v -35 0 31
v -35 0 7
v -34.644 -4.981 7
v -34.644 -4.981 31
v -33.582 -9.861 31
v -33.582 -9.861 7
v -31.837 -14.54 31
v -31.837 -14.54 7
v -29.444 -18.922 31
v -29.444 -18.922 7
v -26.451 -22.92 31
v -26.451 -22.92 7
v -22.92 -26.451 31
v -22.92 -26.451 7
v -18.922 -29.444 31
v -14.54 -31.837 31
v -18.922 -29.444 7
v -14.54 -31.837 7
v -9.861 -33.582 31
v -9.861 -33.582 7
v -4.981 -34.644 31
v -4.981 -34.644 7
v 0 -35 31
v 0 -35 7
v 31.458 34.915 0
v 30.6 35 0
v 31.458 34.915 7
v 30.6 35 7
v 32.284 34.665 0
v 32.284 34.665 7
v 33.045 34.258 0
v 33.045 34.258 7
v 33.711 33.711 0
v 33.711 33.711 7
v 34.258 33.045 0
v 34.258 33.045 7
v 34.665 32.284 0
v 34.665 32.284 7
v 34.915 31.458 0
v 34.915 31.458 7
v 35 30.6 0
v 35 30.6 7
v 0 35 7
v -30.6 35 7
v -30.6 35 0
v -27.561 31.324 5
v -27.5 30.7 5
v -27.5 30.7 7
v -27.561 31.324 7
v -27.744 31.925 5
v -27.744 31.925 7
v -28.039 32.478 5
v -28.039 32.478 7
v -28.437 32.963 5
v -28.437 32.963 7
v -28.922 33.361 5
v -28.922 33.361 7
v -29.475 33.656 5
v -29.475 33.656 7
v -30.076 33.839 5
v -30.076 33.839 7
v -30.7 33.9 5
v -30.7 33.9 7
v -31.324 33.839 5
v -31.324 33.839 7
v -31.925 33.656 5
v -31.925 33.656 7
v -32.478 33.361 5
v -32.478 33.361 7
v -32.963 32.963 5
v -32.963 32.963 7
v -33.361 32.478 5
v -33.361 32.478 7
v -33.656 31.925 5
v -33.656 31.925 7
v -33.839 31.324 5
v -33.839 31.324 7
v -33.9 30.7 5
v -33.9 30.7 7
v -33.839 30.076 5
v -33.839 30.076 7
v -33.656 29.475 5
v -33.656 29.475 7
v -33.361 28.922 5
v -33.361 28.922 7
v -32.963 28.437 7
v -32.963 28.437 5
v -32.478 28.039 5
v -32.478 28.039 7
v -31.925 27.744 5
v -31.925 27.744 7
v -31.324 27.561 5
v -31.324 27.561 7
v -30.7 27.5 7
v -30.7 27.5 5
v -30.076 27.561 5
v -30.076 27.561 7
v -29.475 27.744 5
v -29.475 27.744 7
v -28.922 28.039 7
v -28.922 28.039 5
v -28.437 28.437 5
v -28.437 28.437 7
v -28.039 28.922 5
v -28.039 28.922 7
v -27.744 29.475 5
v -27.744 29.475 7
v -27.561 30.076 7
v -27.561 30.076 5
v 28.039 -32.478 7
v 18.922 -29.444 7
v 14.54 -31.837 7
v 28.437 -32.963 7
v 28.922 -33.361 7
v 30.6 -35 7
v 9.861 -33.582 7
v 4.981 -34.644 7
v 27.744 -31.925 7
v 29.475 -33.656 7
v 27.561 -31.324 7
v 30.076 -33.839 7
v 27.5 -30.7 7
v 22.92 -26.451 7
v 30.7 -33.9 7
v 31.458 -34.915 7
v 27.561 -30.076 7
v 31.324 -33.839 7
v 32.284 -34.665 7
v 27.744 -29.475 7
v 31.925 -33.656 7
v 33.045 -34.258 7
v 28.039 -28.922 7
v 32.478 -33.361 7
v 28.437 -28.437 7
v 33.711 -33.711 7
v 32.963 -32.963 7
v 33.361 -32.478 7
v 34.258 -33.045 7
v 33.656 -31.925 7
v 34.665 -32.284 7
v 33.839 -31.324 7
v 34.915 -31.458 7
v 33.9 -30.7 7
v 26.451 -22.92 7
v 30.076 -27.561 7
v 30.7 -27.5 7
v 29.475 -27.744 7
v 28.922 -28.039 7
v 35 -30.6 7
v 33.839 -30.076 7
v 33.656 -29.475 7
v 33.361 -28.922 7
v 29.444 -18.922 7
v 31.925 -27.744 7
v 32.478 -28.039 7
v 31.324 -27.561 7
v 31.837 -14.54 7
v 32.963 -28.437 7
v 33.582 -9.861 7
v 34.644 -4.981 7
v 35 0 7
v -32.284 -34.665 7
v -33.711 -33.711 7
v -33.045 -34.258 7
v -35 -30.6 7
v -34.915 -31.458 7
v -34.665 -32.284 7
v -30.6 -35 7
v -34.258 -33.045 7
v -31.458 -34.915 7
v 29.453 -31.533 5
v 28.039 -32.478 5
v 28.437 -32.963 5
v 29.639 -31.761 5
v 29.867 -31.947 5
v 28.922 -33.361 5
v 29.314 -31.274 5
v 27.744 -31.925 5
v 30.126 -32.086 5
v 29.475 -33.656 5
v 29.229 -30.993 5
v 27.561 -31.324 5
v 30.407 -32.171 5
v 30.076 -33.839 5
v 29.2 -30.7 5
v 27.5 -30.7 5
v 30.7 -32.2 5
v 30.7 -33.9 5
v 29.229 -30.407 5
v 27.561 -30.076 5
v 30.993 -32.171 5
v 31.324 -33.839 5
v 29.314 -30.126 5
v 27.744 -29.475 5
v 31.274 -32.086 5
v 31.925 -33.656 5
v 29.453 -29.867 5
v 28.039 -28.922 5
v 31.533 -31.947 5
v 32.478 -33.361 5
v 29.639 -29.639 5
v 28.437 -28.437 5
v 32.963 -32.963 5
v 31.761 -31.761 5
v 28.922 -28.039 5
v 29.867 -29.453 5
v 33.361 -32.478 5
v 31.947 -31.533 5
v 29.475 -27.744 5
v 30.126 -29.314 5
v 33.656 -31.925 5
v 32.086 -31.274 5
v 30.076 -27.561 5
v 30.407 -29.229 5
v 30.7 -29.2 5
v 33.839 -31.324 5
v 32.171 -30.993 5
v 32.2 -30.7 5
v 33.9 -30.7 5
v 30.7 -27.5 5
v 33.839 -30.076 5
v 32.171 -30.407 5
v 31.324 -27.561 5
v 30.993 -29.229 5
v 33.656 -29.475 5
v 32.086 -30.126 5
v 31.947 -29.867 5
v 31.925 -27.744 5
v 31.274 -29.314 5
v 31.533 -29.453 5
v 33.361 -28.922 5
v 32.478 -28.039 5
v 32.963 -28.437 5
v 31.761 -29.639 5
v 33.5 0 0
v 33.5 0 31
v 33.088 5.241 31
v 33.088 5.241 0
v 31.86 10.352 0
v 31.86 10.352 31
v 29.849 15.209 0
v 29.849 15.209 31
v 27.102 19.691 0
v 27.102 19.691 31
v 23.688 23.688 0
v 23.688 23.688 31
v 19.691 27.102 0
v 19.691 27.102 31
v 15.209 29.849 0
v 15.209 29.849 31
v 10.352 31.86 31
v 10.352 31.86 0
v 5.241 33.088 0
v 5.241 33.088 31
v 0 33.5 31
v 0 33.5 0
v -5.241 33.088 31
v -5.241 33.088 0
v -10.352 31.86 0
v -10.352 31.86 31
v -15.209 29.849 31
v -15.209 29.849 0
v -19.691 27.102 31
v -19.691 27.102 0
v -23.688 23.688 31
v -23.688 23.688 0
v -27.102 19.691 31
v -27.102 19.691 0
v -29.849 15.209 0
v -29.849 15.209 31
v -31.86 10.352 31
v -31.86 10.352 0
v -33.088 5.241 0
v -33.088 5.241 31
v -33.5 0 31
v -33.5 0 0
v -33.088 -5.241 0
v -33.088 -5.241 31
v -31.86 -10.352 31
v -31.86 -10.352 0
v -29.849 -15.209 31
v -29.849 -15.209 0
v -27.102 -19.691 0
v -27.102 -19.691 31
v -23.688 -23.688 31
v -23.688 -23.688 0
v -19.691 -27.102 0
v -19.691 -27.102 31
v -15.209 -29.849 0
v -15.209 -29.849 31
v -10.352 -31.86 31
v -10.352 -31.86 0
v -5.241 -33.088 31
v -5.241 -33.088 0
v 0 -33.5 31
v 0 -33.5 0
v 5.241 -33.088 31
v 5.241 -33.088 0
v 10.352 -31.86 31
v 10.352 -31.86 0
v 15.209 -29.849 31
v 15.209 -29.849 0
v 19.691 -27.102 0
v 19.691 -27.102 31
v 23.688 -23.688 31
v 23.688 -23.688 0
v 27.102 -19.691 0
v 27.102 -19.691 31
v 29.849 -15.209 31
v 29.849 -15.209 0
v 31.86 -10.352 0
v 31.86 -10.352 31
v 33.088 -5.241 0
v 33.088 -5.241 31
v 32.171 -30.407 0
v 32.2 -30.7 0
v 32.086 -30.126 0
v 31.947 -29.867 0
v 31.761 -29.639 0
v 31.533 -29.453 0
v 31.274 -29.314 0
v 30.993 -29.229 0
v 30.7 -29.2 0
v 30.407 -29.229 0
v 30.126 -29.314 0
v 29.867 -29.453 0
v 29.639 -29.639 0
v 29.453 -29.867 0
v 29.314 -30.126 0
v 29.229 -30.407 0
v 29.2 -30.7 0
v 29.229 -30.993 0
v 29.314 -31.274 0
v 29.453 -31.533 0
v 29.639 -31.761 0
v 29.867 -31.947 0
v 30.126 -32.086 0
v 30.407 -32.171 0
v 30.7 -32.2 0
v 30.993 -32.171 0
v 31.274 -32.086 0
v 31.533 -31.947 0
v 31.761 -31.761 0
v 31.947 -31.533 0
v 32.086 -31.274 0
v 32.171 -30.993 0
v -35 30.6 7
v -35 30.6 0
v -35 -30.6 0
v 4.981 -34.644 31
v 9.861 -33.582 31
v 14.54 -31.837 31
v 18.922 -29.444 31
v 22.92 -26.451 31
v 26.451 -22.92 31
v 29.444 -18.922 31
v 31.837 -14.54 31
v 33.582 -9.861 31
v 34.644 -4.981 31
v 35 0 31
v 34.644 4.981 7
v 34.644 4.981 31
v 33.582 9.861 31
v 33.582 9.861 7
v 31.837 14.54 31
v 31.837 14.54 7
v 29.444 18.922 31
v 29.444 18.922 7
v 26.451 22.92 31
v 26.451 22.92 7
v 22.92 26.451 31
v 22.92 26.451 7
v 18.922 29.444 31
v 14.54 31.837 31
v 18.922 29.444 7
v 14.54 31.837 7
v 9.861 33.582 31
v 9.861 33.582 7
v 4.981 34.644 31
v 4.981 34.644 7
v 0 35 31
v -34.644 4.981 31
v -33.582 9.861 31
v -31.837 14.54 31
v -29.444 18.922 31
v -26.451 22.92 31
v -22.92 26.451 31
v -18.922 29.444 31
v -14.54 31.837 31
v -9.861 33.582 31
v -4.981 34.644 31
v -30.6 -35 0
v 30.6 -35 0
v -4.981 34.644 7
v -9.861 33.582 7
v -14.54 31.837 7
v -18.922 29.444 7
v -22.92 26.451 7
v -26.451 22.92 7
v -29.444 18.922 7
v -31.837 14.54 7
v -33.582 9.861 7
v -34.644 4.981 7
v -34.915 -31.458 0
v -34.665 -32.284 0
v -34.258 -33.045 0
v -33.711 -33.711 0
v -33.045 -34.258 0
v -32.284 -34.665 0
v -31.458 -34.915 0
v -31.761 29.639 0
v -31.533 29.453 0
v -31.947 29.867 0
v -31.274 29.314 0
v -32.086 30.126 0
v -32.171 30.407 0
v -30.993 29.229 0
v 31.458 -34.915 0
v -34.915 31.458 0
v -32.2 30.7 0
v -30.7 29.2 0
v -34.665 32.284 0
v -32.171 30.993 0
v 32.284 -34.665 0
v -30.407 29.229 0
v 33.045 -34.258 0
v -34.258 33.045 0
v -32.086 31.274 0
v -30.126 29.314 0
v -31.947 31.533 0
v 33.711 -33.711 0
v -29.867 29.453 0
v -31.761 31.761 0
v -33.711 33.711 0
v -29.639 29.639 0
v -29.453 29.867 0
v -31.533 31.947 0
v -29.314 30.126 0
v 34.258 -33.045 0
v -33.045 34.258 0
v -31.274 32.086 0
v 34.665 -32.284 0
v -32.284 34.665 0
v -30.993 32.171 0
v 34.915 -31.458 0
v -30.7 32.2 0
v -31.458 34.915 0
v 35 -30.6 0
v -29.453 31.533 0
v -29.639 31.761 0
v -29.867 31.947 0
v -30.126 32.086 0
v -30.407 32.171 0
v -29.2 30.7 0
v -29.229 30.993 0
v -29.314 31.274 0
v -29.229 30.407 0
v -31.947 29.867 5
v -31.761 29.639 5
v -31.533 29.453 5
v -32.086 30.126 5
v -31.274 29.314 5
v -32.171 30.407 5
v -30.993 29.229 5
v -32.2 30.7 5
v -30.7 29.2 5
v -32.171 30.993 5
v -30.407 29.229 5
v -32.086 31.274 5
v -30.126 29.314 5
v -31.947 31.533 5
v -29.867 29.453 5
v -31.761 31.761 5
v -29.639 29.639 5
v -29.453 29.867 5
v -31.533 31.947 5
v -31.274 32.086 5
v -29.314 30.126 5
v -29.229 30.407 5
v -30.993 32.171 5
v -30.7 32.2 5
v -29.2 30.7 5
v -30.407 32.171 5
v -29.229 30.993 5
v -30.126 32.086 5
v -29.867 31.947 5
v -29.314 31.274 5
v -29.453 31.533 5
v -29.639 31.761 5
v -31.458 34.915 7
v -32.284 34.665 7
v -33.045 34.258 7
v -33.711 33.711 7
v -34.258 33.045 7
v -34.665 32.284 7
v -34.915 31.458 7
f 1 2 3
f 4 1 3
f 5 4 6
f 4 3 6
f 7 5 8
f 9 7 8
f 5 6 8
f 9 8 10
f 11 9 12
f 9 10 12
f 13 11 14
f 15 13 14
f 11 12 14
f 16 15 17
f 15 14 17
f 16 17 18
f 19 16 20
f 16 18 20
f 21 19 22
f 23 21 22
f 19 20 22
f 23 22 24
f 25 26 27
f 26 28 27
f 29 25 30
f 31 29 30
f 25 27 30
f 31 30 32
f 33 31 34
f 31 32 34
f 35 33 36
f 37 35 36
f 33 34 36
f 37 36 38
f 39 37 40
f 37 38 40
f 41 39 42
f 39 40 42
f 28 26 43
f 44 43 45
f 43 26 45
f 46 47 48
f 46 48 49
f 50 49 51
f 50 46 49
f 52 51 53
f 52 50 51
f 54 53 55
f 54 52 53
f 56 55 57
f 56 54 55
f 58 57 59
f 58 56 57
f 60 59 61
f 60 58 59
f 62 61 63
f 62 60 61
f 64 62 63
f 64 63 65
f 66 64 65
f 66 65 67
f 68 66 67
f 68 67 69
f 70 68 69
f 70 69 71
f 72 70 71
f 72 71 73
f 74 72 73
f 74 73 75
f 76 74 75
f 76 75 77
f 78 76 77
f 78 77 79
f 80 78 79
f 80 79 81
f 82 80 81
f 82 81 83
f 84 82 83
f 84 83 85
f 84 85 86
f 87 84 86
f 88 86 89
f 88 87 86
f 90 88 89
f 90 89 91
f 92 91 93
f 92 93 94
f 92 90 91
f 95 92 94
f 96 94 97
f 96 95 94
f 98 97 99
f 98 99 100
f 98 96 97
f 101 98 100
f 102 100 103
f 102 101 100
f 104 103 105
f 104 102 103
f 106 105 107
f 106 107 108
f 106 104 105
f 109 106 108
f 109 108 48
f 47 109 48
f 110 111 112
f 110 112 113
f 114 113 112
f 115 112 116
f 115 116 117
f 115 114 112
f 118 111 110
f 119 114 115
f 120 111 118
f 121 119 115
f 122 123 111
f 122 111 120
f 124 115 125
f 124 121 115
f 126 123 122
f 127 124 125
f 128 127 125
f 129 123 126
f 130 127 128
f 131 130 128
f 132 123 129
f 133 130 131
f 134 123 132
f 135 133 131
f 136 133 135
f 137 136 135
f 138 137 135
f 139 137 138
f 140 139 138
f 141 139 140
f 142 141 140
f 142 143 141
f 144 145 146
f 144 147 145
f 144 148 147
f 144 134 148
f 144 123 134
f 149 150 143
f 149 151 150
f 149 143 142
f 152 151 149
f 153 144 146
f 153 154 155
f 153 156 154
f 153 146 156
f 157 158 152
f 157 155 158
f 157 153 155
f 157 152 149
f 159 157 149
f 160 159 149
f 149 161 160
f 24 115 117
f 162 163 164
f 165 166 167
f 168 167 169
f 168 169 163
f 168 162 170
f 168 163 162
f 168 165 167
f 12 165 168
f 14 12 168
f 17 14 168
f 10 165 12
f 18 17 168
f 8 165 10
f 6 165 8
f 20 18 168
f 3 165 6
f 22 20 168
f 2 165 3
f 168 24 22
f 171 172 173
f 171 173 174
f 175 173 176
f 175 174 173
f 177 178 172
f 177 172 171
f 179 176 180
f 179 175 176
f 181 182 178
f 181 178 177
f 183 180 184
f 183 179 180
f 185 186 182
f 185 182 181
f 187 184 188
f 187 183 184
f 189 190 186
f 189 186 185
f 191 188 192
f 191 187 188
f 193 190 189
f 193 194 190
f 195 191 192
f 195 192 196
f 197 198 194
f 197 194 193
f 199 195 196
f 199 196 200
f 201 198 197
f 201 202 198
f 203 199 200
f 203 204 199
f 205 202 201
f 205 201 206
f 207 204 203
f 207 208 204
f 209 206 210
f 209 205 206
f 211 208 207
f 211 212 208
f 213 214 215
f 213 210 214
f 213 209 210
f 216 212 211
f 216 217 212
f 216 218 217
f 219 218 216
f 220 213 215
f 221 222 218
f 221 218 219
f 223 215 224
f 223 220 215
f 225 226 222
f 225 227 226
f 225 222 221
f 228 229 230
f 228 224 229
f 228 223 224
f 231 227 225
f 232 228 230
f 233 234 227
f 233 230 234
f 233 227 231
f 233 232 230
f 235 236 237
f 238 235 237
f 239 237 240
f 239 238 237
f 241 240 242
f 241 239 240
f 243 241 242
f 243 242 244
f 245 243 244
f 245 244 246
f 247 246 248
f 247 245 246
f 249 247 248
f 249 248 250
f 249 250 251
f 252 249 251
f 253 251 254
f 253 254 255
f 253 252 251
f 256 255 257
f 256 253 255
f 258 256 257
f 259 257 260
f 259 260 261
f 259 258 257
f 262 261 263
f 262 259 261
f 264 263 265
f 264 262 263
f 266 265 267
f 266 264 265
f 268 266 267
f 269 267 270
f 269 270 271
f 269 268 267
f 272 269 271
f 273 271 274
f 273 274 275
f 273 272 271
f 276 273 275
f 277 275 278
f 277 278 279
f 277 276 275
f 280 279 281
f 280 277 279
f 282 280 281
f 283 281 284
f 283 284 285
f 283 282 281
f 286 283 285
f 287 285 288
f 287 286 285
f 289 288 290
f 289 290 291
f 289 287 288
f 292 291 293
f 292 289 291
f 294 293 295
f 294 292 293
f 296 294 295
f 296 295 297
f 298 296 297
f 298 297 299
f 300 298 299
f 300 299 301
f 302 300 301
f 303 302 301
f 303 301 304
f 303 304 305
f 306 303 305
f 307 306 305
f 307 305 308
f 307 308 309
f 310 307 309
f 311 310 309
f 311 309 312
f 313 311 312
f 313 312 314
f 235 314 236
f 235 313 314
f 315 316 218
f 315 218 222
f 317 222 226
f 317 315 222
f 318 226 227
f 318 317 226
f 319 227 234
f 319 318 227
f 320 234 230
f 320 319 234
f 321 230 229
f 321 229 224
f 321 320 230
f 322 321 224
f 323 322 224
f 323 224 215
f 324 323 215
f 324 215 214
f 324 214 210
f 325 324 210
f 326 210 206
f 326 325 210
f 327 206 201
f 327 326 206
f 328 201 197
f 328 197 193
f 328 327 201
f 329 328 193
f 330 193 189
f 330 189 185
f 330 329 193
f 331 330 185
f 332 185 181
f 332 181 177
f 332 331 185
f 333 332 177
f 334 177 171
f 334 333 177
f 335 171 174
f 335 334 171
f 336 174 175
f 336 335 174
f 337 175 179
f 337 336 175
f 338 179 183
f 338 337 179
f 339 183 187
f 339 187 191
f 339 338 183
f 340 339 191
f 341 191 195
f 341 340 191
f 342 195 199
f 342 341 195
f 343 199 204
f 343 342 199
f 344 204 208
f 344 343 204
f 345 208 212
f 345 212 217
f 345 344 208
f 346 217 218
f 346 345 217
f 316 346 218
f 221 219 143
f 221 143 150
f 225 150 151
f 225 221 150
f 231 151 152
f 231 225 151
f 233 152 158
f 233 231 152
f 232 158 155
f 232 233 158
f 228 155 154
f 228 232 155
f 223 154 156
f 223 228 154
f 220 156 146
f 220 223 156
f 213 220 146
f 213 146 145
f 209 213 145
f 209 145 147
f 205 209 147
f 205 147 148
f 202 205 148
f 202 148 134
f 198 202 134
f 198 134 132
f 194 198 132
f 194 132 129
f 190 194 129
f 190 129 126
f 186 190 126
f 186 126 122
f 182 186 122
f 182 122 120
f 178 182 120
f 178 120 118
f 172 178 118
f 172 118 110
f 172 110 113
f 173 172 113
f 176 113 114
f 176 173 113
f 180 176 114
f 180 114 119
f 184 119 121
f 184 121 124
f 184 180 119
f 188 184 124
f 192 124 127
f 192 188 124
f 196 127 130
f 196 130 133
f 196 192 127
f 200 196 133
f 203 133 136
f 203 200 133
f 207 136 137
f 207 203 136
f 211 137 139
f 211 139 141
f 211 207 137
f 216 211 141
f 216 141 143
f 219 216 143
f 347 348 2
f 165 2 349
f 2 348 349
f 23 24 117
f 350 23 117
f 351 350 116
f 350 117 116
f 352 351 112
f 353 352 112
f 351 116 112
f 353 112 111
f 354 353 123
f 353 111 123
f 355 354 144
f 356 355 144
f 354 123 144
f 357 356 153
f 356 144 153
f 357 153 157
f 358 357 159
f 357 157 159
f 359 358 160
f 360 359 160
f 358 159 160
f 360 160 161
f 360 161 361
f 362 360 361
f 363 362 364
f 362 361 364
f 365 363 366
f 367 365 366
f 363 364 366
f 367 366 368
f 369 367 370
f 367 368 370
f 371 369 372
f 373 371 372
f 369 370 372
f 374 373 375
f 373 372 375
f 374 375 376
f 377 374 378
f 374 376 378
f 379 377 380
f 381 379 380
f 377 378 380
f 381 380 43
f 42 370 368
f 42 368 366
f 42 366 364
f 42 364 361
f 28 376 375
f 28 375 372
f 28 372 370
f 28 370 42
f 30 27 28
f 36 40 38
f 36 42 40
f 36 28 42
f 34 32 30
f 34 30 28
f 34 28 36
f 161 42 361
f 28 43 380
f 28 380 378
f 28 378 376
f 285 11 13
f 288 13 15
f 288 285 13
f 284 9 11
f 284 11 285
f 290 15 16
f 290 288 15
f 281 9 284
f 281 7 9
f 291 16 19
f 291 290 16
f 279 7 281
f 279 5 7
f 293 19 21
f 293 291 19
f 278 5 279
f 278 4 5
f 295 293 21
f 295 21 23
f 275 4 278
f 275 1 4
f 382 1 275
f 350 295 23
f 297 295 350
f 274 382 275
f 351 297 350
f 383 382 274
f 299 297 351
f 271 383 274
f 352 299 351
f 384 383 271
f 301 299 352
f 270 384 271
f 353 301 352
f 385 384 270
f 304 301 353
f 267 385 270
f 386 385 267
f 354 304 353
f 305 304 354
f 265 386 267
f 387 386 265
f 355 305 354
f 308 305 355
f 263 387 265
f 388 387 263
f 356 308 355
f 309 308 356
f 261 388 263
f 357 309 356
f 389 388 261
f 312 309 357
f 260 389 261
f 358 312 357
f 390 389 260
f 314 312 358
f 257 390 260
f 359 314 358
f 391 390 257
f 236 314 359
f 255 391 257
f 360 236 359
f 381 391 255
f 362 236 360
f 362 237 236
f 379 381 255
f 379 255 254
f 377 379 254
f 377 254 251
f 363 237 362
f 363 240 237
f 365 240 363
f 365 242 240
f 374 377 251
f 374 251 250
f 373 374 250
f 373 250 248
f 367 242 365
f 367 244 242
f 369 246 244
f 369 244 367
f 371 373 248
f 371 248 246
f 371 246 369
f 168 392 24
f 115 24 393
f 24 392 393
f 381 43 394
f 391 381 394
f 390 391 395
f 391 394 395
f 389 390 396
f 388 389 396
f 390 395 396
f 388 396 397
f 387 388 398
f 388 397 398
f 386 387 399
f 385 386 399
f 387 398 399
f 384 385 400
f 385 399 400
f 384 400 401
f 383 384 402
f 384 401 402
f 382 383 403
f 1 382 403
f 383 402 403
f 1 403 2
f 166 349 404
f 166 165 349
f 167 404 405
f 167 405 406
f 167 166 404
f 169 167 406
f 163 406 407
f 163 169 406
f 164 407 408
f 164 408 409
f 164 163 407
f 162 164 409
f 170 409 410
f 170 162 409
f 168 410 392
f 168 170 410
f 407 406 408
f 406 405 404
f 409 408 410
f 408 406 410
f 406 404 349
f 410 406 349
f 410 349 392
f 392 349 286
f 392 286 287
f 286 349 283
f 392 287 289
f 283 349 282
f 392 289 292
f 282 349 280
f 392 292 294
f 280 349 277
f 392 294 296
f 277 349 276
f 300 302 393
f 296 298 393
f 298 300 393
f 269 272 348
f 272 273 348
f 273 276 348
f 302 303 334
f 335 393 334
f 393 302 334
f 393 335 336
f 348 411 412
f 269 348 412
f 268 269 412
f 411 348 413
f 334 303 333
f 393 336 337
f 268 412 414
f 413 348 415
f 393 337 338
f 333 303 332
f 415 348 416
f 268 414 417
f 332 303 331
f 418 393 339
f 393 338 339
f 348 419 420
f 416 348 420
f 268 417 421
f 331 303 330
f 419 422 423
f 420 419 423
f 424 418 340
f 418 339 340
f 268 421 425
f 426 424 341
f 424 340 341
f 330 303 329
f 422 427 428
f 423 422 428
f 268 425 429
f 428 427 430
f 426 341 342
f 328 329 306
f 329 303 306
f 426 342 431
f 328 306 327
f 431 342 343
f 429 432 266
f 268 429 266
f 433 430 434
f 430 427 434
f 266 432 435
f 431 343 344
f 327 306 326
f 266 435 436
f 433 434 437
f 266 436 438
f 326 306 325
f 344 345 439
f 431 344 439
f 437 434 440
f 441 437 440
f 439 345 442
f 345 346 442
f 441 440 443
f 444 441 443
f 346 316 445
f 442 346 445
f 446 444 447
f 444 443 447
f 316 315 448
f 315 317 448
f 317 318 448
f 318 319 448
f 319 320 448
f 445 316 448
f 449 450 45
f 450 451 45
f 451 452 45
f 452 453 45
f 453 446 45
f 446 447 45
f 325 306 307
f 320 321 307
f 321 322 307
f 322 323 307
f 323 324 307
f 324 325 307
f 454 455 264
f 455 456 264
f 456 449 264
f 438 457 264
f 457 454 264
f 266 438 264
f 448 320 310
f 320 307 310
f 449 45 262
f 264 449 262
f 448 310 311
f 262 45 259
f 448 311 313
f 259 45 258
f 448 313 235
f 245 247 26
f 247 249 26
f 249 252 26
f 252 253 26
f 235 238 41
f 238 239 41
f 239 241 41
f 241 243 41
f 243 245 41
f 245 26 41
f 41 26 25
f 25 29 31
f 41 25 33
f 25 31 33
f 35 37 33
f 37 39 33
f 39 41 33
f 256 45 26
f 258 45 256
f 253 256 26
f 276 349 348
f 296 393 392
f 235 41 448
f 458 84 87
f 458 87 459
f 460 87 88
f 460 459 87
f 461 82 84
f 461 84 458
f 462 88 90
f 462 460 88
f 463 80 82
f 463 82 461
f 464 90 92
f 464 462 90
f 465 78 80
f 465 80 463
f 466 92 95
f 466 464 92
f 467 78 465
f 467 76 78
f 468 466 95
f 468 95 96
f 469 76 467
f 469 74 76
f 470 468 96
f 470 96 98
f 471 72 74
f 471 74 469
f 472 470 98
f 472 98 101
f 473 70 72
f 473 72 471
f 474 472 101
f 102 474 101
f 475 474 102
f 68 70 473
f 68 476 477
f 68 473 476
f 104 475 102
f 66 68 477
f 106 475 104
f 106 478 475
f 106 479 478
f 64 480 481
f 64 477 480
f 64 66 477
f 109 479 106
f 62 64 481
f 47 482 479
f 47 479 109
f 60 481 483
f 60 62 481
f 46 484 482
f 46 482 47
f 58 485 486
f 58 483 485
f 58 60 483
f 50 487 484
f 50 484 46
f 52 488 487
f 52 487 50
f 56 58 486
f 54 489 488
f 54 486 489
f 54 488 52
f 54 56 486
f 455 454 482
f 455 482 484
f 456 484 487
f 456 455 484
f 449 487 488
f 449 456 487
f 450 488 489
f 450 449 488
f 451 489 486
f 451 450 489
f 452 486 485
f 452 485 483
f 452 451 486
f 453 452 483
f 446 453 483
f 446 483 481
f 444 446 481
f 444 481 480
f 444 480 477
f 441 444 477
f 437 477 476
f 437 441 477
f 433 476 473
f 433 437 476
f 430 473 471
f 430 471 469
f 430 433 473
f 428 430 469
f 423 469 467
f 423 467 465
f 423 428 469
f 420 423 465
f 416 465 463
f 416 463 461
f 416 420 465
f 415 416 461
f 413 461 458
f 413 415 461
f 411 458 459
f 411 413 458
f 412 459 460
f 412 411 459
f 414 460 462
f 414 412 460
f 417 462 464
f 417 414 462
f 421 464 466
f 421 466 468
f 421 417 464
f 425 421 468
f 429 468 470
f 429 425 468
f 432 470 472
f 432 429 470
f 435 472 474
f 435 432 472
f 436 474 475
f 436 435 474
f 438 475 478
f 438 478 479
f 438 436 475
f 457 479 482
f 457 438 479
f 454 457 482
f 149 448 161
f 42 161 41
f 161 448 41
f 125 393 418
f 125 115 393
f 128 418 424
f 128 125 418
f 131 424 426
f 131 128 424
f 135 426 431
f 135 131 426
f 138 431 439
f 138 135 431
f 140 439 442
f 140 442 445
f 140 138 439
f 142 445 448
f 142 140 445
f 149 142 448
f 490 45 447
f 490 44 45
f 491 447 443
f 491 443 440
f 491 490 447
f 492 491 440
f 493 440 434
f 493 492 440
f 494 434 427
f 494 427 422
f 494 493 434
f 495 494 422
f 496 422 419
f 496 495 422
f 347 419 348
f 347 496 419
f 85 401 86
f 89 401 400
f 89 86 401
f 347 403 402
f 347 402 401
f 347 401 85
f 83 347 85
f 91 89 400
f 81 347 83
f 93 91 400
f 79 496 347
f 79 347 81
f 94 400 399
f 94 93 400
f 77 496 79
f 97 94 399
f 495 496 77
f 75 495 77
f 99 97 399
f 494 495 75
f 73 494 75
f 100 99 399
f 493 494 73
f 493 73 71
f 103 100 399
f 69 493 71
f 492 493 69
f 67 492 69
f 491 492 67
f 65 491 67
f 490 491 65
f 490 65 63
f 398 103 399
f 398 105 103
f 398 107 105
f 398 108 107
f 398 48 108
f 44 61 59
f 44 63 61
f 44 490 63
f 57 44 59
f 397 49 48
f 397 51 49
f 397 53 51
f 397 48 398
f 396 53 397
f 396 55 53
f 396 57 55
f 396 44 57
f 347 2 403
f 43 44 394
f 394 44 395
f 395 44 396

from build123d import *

# Parameters (mm, degrees)
F0_R     = 33.5
F1_DEPTH = 31
F0_R_2   = 3.2
F2_DEPTH = 7
F0_R_3   = 1.5
F3_DEPTH = 5
F4_R     = 4.4


with BuildPart() as f1:
    # F0 (on Top) → F1 (new body)
    with BuildSketch(Plane.XY):
        with BuildLine():
            ThreePointArc((35, 0), (24.748737, 24.748737), (0, 35))
            ThreePointArc((0, 35), (-24.748737, 24.748737), (-35, 0))
            ThreePointArc((-35, 0), (-24.748737, -24.748737), (0, -35))
            ThreePointArc((0, -35), (24.748737, -24.748737), (35, 0))
        make_face()
        Circle(F0_R, mode=Mode.SUBTRACT)
    extrude(amount=F1_DEPTH)

    # F0 (on Top) → F2 (join)
    with BuildSketch(Plane.XY):
        with BuildLine():
            Line((35, 0), (35, 35))
            Line((35, 35), (0, 35))
            ThreePointArc((0, 35), (24.748737, 24.748737), (35, 0))
        make_face()
        with BuildLine():
            ThreePointArc((-35, 0), (-24.748737, 24.748737), (0, 35))
            Line((0, 35), (-35, 35))
            Line((-35, 35), (-35, 0))
        make_face()
        with Locations((-30.7, 30.7)):
            Circle(F0_R_2, mode=Mode.SUBTRACT)
        with BuildLine():
            Line((35, -35), (35, 0))
            ThreePointArc((35, 0), (24.748737, -24.748737), (0, -35))
            Line((0, -35), (35, -35))
        make_face()
        with Locations((30.7, -30.7)):
            Circle(F0_R_2, mode=Mode.SUBTRACT)
        with BuildLine():
            ThreePointArc((0, -35), (-24.748737, -24.748737), (-35, 0))
            Line((-35, 0), (-35, -35))
            Line((-35, -35), (0, -35))
        make_face()
    extrude(amount=F2_DEPTH)

    # F0 (on Top) → F3 (join)
    with BuildSketch(Plane.XY):
        with Locations((-30.7, 30.7)):
            Circle(F0_R_2)
        with Locations((-30.7, 30.7)):
            Circle(F0_R_3, mode=Mode.SUBTRACT)
        with Locations((30.7, -30.7)):
            Circle(F0_R_2)
        with Locations((30.7, -30.7)):
            Circle(F0_R_3, mode=Mode.SUBTRACT)
    extrude(amount=F3_DEPTH)

    # F4
    f4_edges = [f1.edges().sort_by_distance(p)[0] for p in [
        (-35, 35, 3.5),
        (35, -35, 3.5),
        (35, 35, 3.5),
        (-35, -35, 3.5),
    ]]
    fillet(f4_edges, radius=F4_R)


solid = f1.part
